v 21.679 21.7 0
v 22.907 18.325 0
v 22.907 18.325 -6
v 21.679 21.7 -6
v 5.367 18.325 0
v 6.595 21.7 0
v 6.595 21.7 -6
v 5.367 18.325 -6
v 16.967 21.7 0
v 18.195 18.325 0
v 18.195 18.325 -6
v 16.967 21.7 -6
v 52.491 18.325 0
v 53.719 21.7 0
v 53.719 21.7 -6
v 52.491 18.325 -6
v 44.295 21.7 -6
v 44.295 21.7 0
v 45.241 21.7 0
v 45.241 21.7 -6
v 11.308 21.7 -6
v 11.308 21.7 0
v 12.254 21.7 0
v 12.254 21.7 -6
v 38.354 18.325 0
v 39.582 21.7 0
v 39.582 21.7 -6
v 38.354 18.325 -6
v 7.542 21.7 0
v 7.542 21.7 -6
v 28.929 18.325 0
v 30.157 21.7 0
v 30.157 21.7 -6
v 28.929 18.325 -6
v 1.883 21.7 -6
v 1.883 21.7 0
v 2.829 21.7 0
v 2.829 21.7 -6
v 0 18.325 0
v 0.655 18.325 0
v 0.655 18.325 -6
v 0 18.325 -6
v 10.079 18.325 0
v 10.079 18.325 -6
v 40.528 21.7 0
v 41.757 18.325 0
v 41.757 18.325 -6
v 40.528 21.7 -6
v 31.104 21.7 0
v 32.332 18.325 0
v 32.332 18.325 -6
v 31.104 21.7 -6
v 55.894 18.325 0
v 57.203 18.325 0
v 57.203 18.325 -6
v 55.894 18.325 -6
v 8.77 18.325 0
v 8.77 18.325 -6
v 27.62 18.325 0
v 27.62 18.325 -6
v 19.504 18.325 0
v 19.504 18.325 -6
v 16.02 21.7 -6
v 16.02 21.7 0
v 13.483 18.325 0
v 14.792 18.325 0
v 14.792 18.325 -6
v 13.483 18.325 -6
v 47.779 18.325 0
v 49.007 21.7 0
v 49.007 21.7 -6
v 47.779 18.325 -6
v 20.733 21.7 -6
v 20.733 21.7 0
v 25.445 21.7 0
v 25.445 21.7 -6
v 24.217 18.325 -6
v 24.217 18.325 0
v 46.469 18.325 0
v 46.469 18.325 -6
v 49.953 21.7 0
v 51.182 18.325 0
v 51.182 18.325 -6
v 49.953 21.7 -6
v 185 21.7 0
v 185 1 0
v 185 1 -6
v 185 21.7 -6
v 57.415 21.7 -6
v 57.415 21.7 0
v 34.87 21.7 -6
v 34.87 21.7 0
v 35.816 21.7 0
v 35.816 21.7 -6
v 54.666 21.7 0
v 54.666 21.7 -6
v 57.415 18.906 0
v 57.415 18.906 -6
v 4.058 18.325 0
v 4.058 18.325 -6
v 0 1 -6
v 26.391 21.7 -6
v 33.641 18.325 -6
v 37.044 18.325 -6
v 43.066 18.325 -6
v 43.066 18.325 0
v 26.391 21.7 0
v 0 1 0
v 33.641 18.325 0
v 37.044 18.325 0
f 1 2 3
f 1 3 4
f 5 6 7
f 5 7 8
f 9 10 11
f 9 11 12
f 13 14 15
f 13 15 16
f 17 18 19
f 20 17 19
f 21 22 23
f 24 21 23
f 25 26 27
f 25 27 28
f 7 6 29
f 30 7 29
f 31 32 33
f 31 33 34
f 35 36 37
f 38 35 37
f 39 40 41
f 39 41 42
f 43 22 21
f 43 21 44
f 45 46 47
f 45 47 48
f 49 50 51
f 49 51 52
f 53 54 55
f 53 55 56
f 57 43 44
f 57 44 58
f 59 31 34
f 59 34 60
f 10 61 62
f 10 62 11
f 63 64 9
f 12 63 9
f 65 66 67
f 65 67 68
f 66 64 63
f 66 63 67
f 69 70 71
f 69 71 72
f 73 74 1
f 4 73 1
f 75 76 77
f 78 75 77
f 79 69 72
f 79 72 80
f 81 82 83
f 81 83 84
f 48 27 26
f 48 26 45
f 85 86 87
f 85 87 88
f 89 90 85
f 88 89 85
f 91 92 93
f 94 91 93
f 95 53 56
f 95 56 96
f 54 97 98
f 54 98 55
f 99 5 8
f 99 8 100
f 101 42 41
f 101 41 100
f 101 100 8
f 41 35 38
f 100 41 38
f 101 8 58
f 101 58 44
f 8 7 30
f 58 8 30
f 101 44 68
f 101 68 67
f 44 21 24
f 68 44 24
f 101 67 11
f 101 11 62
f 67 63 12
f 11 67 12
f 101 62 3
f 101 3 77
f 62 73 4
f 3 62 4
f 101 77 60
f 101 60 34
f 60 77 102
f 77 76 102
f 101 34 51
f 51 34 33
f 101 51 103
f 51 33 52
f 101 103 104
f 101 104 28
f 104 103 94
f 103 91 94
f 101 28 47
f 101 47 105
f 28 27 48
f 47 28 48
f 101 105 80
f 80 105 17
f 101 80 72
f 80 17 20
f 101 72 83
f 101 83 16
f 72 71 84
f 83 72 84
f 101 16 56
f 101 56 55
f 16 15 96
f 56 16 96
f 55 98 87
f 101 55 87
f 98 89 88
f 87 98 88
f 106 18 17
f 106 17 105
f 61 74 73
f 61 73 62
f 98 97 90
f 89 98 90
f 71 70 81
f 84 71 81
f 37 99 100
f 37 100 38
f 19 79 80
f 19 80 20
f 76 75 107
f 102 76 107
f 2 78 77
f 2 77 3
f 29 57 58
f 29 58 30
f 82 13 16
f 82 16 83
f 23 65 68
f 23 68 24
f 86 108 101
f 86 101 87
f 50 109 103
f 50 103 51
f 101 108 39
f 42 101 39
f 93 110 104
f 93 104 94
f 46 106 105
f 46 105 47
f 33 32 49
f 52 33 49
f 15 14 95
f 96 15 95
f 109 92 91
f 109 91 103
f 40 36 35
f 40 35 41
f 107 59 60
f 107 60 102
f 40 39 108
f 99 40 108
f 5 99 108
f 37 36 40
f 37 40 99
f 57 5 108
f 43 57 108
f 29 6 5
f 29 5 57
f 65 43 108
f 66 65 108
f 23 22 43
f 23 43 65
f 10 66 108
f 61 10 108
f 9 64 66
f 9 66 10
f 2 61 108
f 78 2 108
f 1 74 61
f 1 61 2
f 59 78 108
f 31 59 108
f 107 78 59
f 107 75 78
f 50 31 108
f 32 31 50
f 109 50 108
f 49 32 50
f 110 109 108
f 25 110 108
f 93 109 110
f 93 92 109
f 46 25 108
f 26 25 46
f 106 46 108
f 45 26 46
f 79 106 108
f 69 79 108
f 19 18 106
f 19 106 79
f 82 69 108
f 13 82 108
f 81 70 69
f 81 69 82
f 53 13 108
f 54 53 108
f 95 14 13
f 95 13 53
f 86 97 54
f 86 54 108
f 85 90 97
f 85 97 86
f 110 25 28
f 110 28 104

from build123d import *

# Parameters (mm, degrees)
BLANKSKE_W              = 185
BLANKSKE_H              = 21.7
BLANK_DEPTH             = 6
TOOTHCUTSIM_DEPTH       = 187.364937689
TEETHCUTS_COUNT         = 40
TEETHCUTS_PITCH         = 4.712388975
ESQUISSE2_W             = 127.585231164
ESQUISSE2_H             = 3.375
BOSS_EXTRU_1_DEPTH      = 6
ESQUISSE3_W             = 185
ESQUISSE3_H             = 1
ENL_V_MAT_EXTRU_1_DEPTH = 6


with BuildPart() as part:
    # BlankSke → Blank (new body)
    with BuildSketch(Plane.XY):
        with Locations((92.5, 10.85)):
            Rectangle(BLANKSKE_W, BLANKSKE_H)
    extrude(amount=-BLANK_DEPTH)

    # TooCutSkeSim → ToothCutSim (cut, through all)
    with BuildSketch(Plane.XY):
        Polygon((0.654653055, 18.325), (-0.654653055, 18.325), (-1.892297439, 21.7254), (1.892297439, 21.7254), align=None)
    toothcutsim = extrude(amount=-TOOTHCUTSIM_DEPTH, mode=Mode.SUBTRACT)

    # TeethCuts: ToothCutSim ×40
    with Locations(*[(i * TEETHCUTS_PITCH, 0, 0) for i in range(1, TEETHCUTS_COUNT)]):
        add(toothcutsim, mode=Mode.SUBTRACT)

    # Esquisse2 → Boss.-Extru.1 (add)
    with BuildSketch(Plane.XY):
        with Locations((121.207384418, 20.0125)):
            Rectangle(ESQUISSE2_W, ESQUISSE2_H)
    extrude(amount=-BOSS_EXTRU_1_DEPTH)

    # Esquisse3 → Enlèv. mat.-Extru.1 (cut)
    with BuildSketch(Plane.XY):
        with Locations((92.5, 0.5)):
            Rectangle(ESQUISSE3_W, ESQUISSE3_H)
    extrude(amount=-ENL_V_MAT_EXTRU_1_DEPTH, mode=Mode.SUBTRACT)


solid = part.part
